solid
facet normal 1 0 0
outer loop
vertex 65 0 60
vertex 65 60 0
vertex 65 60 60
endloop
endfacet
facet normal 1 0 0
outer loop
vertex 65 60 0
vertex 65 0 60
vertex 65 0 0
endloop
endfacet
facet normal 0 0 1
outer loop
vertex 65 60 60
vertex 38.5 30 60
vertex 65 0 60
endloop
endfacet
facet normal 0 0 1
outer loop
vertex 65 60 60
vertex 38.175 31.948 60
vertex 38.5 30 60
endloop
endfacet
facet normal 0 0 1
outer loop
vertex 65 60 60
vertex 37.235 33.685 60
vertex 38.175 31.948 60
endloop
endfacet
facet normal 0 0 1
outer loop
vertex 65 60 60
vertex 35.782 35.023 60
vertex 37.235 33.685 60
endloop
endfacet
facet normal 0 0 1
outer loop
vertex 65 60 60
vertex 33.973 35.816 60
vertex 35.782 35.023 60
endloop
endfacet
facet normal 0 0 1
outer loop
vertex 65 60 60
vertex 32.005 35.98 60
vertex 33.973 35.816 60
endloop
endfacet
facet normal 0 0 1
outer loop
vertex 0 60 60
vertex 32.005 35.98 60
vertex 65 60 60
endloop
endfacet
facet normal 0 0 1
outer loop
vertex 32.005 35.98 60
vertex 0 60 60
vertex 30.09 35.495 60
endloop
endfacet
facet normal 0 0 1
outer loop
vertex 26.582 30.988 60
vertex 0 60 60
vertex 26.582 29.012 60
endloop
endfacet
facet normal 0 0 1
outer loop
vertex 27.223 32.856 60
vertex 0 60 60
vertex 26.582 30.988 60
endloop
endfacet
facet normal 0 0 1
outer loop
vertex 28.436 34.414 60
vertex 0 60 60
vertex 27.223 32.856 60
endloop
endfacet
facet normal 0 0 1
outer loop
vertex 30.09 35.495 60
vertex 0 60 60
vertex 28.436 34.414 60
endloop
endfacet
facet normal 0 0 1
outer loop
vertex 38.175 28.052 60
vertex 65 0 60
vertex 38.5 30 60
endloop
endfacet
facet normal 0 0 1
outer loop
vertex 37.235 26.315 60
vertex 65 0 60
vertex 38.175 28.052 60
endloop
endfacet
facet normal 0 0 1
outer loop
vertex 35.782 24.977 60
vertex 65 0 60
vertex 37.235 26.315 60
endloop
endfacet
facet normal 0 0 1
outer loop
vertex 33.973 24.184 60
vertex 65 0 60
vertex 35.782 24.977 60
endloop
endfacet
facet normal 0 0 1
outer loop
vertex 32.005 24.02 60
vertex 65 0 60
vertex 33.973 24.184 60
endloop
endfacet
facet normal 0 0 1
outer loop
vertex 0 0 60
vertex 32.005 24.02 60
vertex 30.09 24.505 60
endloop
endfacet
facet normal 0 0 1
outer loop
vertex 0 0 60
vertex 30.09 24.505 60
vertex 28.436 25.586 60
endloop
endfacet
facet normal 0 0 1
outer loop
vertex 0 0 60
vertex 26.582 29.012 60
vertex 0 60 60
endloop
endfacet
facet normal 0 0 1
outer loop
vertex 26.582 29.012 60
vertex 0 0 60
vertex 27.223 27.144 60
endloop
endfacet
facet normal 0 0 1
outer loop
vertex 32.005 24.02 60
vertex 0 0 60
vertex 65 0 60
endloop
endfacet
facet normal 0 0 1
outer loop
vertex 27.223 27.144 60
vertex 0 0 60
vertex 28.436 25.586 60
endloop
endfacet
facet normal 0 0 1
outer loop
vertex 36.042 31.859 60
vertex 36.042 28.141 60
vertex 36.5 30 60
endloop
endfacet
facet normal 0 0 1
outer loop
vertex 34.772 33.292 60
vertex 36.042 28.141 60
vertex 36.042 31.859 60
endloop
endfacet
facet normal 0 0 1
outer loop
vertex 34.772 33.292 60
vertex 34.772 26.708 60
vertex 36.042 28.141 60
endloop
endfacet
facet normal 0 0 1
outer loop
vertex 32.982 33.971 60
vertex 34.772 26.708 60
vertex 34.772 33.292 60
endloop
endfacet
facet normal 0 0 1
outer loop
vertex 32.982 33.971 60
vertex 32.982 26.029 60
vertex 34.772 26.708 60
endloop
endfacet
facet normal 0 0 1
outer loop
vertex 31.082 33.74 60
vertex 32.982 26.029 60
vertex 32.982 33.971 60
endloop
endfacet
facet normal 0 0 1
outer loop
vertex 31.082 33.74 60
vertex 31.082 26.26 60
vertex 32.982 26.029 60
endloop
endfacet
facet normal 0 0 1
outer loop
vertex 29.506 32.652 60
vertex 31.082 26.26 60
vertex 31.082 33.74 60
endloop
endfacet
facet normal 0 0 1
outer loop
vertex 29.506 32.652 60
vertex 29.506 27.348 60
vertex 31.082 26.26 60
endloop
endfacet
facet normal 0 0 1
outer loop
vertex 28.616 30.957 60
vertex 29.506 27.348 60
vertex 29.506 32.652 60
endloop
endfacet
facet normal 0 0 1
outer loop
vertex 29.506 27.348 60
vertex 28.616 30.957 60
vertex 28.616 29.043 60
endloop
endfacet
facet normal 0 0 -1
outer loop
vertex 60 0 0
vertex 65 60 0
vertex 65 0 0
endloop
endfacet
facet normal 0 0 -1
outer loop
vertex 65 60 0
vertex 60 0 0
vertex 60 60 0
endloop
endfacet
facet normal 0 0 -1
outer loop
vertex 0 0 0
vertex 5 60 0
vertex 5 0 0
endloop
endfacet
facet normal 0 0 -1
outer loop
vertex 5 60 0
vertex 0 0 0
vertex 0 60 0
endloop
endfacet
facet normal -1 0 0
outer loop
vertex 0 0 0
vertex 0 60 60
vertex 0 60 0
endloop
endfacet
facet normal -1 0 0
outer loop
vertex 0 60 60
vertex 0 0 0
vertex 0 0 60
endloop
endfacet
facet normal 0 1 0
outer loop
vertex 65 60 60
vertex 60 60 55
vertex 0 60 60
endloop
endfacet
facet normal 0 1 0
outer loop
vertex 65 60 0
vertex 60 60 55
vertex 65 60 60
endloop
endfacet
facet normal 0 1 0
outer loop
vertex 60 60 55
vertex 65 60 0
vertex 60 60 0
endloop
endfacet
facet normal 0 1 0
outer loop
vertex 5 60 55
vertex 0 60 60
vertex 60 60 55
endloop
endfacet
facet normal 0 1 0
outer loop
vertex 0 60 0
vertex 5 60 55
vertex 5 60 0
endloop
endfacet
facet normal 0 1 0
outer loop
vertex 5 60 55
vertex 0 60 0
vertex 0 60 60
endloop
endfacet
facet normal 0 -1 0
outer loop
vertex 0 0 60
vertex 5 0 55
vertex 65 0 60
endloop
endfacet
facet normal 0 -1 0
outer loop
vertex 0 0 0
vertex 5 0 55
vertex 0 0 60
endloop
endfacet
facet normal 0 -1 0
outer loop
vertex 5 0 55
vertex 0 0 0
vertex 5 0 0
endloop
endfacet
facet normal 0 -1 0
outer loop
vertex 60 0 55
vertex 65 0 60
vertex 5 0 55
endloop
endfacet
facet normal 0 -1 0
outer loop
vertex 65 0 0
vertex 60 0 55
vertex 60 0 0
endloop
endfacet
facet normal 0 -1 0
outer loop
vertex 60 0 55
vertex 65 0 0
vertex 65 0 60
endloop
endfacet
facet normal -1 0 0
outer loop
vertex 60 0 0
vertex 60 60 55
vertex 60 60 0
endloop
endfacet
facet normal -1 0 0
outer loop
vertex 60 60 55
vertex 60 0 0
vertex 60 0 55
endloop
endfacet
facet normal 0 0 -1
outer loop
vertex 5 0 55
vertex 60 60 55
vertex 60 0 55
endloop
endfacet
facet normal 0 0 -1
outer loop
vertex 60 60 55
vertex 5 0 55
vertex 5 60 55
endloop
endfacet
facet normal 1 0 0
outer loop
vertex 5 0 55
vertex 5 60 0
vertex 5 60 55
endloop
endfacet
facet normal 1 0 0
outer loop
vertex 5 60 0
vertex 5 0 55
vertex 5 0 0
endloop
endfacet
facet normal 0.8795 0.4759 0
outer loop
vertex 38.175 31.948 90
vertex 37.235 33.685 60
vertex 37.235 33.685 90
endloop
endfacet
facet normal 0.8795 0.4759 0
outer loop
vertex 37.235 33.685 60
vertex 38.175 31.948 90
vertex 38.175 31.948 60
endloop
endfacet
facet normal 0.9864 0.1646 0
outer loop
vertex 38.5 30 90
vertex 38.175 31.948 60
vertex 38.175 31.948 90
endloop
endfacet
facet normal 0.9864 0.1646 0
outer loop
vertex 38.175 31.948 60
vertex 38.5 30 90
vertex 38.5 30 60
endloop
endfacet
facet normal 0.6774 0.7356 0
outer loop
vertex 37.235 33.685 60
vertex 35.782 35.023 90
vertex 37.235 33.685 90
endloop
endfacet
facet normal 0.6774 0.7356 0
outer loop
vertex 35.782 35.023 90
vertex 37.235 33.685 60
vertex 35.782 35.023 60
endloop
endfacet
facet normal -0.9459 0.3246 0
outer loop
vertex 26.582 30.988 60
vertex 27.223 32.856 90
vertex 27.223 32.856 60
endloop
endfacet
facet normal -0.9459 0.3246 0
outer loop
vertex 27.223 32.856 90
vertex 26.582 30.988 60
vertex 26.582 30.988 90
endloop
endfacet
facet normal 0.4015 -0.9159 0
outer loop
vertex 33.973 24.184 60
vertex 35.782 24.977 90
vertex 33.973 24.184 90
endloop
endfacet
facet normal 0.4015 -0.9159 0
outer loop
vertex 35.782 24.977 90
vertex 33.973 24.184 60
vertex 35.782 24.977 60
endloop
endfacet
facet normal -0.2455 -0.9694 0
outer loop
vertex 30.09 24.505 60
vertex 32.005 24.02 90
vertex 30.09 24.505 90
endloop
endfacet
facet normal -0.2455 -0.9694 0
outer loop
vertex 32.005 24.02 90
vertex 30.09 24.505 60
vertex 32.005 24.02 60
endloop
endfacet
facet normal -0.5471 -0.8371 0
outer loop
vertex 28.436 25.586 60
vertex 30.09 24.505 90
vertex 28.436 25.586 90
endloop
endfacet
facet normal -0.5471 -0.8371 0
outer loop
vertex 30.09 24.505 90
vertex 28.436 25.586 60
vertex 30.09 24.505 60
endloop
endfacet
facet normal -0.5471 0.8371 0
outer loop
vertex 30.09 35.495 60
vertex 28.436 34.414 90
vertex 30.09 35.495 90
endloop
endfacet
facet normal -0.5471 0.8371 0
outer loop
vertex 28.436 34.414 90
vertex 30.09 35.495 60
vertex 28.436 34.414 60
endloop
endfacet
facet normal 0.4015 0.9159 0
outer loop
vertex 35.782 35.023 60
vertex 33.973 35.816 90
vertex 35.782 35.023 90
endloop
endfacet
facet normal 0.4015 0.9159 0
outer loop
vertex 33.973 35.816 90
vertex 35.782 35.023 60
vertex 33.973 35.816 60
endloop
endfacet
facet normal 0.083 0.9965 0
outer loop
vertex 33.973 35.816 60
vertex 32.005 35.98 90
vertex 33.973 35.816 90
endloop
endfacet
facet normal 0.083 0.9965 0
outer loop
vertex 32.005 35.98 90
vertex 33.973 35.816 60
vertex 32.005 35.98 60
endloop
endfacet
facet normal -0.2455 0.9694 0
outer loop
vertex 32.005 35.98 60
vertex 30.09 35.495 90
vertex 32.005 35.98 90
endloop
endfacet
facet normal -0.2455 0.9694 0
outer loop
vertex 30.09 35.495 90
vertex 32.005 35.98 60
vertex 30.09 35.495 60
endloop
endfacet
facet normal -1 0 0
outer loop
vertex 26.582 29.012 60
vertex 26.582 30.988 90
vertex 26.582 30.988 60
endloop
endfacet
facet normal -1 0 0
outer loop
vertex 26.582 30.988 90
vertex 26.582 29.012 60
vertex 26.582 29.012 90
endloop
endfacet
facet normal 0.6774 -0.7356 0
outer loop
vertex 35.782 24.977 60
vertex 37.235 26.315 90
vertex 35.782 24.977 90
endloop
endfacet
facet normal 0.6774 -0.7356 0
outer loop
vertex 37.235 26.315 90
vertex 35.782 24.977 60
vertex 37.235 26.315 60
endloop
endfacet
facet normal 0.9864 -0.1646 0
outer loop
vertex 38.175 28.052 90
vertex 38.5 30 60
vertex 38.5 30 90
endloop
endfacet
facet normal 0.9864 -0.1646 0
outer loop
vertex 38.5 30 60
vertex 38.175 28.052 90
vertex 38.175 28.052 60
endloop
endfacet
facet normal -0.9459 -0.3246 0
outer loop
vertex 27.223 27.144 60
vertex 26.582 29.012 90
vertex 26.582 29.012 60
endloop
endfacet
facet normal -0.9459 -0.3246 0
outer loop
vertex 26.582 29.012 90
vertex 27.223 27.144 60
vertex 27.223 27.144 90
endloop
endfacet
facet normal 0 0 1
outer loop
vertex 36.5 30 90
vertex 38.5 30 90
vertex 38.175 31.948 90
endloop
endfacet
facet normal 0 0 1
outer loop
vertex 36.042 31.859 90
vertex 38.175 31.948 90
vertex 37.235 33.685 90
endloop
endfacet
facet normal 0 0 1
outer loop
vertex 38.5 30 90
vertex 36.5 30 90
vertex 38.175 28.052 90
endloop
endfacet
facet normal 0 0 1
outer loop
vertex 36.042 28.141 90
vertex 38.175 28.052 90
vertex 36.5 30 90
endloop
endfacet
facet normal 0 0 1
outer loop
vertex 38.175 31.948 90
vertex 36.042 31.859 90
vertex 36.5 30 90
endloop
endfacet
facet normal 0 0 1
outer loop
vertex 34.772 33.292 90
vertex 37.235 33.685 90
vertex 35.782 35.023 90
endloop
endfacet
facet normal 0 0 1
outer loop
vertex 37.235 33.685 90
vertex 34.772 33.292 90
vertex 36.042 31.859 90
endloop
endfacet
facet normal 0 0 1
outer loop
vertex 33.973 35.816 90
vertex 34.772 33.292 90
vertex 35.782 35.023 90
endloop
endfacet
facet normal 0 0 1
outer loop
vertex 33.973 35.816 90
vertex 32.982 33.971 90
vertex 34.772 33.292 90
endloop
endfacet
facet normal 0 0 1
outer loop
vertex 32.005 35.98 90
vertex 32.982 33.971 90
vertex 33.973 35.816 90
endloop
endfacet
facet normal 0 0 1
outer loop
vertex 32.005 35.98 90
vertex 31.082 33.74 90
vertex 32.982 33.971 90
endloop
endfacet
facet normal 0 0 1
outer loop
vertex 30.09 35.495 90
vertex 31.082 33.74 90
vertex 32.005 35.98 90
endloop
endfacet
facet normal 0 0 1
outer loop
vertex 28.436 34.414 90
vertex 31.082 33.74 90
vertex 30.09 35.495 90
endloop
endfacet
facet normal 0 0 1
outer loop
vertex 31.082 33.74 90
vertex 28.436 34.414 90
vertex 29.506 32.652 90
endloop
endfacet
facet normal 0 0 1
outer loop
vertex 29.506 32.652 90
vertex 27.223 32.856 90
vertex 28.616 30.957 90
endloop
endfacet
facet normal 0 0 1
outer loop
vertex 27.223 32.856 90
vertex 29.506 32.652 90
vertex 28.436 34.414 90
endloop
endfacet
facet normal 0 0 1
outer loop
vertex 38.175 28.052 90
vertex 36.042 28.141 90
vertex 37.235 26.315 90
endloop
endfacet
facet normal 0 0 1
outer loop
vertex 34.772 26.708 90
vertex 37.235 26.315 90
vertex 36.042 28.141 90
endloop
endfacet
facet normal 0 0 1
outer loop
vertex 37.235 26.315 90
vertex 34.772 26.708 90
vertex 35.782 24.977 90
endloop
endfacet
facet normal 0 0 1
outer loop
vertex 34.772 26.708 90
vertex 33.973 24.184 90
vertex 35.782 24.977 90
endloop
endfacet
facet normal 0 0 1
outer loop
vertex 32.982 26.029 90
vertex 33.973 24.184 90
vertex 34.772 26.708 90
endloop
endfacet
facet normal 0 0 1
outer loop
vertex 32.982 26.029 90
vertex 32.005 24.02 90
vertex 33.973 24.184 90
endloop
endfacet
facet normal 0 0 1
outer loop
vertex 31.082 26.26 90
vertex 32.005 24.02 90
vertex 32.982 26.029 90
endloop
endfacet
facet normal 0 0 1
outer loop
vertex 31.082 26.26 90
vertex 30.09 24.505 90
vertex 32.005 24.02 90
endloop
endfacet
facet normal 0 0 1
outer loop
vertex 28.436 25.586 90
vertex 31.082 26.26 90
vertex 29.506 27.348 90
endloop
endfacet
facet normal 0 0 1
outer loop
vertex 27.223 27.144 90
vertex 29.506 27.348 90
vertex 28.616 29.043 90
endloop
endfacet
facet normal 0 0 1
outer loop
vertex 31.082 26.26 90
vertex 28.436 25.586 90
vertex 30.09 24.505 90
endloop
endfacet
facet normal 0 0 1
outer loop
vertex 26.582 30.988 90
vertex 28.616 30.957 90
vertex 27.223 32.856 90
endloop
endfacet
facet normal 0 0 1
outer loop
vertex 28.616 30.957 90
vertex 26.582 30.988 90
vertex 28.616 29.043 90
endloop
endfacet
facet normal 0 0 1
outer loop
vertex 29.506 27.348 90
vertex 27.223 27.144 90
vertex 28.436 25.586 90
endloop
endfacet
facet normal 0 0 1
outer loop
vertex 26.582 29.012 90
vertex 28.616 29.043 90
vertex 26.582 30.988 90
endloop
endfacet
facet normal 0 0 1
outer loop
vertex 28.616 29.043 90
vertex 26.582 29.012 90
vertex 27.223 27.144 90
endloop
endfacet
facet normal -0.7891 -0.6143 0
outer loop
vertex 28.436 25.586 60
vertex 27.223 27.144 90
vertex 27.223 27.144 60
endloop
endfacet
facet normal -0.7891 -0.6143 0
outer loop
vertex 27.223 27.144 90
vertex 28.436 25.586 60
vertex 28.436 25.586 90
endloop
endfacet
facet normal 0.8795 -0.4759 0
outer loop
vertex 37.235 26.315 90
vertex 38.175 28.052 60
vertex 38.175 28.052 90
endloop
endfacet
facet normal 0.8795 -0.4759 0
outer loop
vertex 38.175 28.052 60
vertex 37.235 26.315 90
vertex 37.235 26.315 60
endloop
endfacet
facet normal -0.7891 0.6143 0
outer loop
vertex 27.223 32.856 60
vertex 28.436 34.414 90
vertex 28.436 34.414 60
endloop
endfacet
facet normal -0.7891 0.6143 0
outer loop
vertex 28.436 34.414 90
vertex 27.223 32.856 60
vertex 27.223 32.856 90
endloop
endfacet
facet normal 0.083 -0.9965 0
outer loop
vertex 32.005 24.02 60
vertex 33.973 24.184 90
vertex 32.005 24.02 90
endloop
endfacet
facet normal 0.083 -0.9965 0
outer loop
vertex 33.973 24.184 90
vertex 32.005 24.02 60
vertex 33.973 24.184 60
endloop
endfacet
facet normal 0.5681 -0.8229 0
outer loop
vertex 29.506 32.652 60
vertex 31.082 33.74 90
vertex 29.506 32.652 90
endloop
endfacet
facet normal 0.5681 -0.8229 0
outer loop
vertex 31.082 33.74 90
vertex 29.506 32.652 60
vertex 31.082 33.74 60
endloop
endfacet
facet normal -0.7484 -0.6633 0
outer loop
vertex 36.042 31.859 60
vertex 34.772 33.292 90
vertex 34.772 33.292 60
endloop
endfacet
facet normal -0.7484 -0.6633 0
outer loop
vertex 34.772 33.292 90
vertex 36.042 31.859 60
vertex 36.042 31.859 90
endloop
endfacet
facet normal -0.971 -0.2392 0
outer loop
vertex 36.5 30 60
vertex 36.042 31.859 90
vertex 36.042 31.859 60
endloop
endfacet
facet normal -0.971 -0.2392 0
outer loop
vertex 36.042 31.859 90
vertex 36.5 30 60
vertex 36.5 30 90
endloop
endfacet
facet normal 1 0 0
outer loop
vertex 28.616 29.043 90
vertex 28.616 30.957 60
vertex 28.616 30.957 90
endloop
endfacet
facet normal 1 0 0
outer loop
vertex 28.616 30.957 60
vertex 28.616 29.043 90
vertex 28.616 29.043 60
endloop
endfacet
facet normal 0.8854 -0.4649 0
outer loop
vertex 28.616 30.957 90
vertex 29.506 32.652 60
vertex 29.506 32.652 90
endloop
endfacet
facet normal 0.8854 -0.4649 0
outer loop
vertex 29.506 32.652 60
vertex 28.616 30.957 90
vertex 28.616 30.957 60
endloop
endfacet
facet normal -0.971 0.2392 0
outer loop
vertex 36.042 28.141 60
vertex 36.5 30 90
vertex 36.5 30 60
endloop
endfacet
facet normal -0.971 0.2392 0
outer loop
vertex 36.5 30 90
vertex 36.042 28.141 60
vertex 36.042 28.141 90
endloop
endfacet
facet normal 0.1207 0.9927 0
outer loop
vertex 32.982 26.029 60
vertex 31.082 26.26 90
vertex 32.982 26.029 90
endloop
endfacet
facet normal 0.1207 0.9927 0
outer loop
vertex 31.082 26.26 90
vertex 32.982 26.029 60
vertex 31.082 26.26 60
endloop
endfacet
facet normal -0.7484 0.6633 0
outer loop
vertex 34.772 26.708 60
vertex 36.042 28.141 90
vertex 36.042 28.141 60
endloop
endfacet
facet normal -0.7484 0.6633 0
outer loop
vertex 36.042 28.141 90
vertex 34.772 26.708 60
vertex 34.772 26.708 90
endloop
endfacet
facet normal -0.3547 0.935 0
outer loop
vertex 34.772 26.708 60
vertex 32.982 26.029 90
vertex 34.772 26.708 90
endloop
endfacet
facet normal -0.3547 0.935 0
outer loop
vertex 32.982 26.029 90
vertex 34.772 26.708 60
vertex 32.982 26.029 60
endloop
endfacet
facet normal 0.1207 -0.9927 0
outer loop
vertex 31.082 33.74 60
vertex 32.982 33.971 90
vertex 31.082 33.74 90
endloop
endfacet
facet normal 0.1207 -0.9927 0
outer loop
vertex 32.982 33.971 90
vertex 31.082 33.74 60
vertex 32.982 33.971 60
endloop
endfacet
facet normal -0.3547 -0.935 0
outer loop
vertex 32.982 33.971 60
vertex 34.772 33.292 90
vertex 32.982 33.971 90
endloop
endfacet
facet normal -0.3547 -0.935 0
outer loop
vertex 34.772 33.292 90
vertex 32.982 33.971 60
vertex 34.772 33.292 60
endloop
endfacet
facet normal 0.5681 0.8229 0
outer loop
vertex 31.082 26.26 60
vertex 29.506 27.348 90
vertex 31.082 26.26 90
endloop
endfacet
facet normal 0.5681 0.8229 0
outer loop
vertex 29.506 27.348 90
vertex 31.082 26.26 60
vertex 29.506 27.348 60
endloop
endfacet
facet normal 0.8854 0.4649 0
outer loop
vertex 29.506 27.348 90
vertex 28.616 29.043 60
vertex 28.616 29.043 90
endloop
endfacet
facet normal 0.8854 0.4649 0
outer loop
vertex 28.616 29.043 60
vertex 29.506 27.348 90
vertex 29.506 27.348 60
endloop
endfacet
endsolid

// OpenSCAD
difference()
{
	cube([65,60,60]);
	translate([5,-1,-1]) cube([55,65,56]);
}
translate([32.5,30,60]) difference()
{
	cylinder(h=30,d=12);
	translate([0,0,0]) cylinder(h=50,d=8);
}
